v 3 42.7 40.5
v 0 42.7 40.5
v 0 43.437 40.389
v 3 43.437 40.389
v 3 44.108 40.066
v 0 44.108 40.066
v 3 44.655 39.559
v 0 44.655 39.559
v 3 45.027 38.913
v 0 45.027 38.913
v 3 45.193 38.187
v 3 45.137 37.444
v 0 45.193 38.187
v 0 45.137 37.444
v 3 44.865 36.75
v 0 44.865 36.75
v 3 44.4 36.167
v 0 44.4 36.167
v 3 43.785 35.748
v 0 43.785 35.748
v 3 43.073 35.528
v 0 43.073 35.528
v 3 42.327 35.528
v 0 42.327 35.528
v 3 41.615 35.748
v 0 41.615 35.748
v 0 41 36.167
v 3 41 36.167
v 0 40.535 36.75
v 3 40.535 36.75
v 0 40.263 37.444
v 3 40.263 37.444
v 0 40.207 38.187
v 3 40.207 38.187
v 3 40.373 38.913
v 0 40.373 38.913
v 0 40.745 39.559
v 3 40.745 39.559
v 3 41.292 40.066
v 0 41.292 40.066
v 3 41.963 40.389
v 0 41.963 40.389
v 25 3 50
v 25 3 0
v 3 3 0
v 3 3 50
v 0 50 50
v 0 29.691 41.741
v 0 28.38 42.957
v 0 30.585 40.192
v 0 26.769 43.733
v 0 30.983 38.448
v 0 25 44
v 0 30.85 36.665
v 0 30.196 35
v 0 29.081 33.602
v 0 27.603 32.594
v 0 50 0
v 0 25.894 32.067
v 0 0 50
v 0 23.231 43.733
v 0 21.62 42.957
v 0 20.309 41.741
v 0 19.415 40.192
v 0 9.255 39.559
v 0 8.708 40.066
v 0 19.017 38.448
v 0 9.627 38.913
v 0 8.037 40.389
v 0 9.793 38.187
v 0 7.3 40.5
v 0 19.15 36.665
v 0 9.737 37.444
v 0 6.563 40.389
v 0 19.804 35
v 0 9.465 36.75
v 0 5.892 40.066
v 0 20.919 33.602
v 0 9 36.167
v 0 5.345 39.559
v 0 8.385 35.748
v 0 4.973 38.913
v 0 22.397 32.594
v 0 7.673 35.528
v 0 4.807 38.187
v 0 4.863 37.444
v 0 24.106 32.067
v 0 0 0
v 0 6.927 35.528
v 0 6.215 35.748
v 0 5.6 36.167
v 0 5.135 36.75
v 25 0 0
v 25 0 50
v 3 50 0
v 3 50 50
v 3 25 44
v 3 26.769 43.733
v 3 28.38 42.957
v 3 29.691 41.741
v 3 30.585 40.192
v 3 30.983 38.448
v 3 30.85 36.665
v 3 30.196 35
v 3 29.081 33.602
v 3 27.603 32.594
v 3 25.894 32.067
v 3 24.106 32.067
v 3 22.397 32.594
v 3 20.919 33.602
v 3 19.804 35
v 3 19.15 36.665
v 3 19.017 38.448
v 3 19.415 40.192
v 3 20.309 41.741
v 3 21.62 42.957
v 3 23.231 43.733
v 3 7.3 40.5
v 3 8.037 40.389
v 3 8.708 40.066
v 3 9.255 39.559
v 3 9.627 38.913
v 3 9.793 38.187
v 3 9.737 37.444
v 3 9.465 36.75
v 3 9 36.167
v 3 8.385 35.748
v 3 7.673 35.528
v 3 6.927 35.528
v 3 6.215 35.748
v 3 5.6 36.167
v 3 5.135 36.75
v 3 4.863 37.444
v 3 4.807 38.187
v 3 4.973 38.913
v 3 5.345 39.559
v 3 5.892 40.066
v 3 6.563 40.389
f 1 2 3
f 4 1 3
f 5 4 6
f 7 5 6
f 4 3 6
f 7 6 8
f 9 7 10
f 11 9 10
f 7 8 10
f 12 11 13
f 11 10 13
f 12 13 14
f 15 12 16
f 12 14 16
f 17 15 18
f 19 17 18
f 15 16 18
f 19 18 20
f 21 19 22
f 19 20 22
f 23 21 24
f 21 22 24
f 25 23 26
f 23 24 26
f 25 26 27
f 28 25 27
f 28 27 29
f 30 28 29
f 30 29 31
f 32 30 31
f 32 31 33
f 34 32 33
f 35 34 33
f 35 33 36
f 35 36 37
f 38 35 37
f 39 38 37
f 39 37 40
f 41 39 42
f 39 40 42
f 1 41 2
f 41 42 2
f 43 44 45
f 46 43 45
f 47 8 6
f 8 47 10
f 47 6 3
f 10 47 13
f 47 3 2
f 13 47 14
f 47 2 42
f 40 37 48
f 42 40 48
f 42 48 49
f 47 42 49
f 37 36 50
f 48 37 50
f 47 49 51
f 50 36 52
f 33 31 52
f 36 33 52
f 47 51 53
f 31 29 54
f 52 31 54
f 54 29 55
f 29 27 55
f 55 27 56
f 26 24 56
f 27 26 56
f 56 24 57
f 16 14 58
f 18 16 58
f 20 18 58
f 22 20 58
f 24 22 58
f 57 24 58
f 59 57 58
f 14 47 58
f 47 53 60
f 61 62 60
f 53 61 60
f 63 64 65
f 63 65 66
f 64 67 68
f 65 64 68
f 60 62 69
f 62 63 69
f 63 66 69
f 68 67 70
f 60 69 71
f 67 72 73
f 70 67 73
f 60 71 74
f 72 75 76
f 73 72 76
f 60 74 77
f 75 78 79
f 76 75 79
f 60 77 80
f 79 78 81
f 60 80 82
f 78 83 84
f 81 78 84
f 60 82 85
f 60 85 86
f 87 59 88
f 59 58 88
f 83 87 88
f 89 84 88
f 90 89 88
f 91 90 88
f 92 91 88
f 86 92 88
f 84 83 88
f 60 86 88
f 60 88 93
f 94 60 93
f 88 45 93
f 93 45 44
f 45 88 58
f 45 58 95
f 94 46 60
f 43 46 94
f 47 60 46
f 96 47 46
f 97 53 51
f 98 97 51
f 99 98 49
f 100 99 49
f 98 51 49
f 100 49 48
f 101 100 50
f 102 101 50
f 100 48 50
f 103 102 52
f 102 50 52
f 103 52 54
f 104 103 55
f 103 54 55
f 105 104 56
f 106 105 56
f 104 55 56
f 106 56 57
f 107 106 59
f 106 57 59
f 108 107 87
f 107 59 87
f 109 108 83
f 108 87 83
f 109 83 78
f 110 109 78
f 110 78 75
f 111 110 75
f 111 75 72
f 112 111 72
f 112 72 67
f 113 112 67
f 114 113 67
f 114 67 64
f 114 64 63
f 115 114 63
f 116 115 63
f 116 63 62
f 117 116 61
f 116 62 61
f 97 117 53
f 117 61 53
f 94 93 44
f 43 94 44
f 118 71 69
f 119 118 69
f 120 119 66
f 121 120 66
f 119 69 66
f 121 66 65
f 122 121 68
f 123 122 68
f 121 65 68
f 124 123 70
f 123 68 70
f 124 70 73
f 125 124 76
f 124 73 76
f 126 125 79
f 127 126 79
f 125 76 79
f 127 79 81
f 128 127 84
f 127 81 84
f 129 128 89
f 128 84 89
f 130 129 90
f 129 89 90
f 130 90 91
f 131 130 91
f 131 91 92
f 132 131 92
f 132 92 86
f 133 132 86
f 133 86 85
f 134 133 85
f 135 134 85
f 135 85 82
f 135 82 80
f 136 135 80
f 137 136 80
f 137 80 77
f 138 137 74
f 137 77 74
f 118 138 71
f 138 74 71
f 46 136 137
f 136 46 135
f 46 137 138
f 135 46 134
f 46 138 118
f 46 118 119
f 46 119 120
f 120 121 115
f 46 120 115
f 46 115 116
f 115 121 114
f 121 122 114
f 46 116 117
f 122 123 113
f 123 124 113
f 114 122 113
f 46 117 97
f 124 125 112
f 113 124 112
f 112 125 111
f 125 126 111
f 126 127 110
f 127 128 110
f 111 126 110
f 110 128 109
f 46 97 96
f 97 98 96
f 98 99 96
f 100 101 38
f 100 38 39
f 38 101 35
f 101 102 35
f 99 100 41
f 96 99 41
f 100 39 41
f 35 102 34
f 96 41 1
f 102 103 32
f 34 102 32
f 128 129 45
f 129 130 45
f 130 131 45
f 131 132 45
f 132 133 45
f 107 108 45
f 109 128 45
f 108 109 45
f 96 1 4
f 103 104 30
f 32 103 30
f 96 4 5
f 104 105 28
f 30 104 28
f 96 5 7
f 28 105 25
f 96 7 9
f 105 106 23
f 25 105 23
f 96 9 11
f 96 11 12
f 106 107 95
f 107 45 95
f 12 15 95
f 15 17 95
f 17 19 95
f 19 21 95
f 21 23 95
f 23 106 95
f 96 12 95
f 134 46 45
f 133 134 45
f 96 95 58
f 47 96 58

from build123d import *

# Parameters (mm, degrees)
SALIENTE_EXTRUIR1_DEPTH = 50
CROQUIS2_R              = 6
CROQUIS2_R_2            = 2.5
CORTAR_EXTRUIR1_DEPTH   = 3


with BuildPart() as part:
    # Croquis1 → Saliente-Extruir1 (new body)
    with BuildSketch(Plane.XY):
        Polygon((0, 50), (0, 0), (25, 0), (25, 3), (3, 3), (3, 50), align=None)
    extrude(amount=SALIENTE_EXTRUIR1_DEPTH)

    # Croquis2 → Cortar-Extruir1 (cut)
    with BuildSketch(Plane.ZY):
        with Locations((38, 25)):
            Circle(CROQUIS2_R)
        with Locations((38, 42.7)):
            Circle(CROQUIS2_R_2)
        with Locations((38, 7.3)):
            Circle(CROQUIS2_R_2)
    extrude(amount=-CORTAR_EXTRUIR1_DEPTH, mode=Mode.SUBTRACT)


solid = part.part
